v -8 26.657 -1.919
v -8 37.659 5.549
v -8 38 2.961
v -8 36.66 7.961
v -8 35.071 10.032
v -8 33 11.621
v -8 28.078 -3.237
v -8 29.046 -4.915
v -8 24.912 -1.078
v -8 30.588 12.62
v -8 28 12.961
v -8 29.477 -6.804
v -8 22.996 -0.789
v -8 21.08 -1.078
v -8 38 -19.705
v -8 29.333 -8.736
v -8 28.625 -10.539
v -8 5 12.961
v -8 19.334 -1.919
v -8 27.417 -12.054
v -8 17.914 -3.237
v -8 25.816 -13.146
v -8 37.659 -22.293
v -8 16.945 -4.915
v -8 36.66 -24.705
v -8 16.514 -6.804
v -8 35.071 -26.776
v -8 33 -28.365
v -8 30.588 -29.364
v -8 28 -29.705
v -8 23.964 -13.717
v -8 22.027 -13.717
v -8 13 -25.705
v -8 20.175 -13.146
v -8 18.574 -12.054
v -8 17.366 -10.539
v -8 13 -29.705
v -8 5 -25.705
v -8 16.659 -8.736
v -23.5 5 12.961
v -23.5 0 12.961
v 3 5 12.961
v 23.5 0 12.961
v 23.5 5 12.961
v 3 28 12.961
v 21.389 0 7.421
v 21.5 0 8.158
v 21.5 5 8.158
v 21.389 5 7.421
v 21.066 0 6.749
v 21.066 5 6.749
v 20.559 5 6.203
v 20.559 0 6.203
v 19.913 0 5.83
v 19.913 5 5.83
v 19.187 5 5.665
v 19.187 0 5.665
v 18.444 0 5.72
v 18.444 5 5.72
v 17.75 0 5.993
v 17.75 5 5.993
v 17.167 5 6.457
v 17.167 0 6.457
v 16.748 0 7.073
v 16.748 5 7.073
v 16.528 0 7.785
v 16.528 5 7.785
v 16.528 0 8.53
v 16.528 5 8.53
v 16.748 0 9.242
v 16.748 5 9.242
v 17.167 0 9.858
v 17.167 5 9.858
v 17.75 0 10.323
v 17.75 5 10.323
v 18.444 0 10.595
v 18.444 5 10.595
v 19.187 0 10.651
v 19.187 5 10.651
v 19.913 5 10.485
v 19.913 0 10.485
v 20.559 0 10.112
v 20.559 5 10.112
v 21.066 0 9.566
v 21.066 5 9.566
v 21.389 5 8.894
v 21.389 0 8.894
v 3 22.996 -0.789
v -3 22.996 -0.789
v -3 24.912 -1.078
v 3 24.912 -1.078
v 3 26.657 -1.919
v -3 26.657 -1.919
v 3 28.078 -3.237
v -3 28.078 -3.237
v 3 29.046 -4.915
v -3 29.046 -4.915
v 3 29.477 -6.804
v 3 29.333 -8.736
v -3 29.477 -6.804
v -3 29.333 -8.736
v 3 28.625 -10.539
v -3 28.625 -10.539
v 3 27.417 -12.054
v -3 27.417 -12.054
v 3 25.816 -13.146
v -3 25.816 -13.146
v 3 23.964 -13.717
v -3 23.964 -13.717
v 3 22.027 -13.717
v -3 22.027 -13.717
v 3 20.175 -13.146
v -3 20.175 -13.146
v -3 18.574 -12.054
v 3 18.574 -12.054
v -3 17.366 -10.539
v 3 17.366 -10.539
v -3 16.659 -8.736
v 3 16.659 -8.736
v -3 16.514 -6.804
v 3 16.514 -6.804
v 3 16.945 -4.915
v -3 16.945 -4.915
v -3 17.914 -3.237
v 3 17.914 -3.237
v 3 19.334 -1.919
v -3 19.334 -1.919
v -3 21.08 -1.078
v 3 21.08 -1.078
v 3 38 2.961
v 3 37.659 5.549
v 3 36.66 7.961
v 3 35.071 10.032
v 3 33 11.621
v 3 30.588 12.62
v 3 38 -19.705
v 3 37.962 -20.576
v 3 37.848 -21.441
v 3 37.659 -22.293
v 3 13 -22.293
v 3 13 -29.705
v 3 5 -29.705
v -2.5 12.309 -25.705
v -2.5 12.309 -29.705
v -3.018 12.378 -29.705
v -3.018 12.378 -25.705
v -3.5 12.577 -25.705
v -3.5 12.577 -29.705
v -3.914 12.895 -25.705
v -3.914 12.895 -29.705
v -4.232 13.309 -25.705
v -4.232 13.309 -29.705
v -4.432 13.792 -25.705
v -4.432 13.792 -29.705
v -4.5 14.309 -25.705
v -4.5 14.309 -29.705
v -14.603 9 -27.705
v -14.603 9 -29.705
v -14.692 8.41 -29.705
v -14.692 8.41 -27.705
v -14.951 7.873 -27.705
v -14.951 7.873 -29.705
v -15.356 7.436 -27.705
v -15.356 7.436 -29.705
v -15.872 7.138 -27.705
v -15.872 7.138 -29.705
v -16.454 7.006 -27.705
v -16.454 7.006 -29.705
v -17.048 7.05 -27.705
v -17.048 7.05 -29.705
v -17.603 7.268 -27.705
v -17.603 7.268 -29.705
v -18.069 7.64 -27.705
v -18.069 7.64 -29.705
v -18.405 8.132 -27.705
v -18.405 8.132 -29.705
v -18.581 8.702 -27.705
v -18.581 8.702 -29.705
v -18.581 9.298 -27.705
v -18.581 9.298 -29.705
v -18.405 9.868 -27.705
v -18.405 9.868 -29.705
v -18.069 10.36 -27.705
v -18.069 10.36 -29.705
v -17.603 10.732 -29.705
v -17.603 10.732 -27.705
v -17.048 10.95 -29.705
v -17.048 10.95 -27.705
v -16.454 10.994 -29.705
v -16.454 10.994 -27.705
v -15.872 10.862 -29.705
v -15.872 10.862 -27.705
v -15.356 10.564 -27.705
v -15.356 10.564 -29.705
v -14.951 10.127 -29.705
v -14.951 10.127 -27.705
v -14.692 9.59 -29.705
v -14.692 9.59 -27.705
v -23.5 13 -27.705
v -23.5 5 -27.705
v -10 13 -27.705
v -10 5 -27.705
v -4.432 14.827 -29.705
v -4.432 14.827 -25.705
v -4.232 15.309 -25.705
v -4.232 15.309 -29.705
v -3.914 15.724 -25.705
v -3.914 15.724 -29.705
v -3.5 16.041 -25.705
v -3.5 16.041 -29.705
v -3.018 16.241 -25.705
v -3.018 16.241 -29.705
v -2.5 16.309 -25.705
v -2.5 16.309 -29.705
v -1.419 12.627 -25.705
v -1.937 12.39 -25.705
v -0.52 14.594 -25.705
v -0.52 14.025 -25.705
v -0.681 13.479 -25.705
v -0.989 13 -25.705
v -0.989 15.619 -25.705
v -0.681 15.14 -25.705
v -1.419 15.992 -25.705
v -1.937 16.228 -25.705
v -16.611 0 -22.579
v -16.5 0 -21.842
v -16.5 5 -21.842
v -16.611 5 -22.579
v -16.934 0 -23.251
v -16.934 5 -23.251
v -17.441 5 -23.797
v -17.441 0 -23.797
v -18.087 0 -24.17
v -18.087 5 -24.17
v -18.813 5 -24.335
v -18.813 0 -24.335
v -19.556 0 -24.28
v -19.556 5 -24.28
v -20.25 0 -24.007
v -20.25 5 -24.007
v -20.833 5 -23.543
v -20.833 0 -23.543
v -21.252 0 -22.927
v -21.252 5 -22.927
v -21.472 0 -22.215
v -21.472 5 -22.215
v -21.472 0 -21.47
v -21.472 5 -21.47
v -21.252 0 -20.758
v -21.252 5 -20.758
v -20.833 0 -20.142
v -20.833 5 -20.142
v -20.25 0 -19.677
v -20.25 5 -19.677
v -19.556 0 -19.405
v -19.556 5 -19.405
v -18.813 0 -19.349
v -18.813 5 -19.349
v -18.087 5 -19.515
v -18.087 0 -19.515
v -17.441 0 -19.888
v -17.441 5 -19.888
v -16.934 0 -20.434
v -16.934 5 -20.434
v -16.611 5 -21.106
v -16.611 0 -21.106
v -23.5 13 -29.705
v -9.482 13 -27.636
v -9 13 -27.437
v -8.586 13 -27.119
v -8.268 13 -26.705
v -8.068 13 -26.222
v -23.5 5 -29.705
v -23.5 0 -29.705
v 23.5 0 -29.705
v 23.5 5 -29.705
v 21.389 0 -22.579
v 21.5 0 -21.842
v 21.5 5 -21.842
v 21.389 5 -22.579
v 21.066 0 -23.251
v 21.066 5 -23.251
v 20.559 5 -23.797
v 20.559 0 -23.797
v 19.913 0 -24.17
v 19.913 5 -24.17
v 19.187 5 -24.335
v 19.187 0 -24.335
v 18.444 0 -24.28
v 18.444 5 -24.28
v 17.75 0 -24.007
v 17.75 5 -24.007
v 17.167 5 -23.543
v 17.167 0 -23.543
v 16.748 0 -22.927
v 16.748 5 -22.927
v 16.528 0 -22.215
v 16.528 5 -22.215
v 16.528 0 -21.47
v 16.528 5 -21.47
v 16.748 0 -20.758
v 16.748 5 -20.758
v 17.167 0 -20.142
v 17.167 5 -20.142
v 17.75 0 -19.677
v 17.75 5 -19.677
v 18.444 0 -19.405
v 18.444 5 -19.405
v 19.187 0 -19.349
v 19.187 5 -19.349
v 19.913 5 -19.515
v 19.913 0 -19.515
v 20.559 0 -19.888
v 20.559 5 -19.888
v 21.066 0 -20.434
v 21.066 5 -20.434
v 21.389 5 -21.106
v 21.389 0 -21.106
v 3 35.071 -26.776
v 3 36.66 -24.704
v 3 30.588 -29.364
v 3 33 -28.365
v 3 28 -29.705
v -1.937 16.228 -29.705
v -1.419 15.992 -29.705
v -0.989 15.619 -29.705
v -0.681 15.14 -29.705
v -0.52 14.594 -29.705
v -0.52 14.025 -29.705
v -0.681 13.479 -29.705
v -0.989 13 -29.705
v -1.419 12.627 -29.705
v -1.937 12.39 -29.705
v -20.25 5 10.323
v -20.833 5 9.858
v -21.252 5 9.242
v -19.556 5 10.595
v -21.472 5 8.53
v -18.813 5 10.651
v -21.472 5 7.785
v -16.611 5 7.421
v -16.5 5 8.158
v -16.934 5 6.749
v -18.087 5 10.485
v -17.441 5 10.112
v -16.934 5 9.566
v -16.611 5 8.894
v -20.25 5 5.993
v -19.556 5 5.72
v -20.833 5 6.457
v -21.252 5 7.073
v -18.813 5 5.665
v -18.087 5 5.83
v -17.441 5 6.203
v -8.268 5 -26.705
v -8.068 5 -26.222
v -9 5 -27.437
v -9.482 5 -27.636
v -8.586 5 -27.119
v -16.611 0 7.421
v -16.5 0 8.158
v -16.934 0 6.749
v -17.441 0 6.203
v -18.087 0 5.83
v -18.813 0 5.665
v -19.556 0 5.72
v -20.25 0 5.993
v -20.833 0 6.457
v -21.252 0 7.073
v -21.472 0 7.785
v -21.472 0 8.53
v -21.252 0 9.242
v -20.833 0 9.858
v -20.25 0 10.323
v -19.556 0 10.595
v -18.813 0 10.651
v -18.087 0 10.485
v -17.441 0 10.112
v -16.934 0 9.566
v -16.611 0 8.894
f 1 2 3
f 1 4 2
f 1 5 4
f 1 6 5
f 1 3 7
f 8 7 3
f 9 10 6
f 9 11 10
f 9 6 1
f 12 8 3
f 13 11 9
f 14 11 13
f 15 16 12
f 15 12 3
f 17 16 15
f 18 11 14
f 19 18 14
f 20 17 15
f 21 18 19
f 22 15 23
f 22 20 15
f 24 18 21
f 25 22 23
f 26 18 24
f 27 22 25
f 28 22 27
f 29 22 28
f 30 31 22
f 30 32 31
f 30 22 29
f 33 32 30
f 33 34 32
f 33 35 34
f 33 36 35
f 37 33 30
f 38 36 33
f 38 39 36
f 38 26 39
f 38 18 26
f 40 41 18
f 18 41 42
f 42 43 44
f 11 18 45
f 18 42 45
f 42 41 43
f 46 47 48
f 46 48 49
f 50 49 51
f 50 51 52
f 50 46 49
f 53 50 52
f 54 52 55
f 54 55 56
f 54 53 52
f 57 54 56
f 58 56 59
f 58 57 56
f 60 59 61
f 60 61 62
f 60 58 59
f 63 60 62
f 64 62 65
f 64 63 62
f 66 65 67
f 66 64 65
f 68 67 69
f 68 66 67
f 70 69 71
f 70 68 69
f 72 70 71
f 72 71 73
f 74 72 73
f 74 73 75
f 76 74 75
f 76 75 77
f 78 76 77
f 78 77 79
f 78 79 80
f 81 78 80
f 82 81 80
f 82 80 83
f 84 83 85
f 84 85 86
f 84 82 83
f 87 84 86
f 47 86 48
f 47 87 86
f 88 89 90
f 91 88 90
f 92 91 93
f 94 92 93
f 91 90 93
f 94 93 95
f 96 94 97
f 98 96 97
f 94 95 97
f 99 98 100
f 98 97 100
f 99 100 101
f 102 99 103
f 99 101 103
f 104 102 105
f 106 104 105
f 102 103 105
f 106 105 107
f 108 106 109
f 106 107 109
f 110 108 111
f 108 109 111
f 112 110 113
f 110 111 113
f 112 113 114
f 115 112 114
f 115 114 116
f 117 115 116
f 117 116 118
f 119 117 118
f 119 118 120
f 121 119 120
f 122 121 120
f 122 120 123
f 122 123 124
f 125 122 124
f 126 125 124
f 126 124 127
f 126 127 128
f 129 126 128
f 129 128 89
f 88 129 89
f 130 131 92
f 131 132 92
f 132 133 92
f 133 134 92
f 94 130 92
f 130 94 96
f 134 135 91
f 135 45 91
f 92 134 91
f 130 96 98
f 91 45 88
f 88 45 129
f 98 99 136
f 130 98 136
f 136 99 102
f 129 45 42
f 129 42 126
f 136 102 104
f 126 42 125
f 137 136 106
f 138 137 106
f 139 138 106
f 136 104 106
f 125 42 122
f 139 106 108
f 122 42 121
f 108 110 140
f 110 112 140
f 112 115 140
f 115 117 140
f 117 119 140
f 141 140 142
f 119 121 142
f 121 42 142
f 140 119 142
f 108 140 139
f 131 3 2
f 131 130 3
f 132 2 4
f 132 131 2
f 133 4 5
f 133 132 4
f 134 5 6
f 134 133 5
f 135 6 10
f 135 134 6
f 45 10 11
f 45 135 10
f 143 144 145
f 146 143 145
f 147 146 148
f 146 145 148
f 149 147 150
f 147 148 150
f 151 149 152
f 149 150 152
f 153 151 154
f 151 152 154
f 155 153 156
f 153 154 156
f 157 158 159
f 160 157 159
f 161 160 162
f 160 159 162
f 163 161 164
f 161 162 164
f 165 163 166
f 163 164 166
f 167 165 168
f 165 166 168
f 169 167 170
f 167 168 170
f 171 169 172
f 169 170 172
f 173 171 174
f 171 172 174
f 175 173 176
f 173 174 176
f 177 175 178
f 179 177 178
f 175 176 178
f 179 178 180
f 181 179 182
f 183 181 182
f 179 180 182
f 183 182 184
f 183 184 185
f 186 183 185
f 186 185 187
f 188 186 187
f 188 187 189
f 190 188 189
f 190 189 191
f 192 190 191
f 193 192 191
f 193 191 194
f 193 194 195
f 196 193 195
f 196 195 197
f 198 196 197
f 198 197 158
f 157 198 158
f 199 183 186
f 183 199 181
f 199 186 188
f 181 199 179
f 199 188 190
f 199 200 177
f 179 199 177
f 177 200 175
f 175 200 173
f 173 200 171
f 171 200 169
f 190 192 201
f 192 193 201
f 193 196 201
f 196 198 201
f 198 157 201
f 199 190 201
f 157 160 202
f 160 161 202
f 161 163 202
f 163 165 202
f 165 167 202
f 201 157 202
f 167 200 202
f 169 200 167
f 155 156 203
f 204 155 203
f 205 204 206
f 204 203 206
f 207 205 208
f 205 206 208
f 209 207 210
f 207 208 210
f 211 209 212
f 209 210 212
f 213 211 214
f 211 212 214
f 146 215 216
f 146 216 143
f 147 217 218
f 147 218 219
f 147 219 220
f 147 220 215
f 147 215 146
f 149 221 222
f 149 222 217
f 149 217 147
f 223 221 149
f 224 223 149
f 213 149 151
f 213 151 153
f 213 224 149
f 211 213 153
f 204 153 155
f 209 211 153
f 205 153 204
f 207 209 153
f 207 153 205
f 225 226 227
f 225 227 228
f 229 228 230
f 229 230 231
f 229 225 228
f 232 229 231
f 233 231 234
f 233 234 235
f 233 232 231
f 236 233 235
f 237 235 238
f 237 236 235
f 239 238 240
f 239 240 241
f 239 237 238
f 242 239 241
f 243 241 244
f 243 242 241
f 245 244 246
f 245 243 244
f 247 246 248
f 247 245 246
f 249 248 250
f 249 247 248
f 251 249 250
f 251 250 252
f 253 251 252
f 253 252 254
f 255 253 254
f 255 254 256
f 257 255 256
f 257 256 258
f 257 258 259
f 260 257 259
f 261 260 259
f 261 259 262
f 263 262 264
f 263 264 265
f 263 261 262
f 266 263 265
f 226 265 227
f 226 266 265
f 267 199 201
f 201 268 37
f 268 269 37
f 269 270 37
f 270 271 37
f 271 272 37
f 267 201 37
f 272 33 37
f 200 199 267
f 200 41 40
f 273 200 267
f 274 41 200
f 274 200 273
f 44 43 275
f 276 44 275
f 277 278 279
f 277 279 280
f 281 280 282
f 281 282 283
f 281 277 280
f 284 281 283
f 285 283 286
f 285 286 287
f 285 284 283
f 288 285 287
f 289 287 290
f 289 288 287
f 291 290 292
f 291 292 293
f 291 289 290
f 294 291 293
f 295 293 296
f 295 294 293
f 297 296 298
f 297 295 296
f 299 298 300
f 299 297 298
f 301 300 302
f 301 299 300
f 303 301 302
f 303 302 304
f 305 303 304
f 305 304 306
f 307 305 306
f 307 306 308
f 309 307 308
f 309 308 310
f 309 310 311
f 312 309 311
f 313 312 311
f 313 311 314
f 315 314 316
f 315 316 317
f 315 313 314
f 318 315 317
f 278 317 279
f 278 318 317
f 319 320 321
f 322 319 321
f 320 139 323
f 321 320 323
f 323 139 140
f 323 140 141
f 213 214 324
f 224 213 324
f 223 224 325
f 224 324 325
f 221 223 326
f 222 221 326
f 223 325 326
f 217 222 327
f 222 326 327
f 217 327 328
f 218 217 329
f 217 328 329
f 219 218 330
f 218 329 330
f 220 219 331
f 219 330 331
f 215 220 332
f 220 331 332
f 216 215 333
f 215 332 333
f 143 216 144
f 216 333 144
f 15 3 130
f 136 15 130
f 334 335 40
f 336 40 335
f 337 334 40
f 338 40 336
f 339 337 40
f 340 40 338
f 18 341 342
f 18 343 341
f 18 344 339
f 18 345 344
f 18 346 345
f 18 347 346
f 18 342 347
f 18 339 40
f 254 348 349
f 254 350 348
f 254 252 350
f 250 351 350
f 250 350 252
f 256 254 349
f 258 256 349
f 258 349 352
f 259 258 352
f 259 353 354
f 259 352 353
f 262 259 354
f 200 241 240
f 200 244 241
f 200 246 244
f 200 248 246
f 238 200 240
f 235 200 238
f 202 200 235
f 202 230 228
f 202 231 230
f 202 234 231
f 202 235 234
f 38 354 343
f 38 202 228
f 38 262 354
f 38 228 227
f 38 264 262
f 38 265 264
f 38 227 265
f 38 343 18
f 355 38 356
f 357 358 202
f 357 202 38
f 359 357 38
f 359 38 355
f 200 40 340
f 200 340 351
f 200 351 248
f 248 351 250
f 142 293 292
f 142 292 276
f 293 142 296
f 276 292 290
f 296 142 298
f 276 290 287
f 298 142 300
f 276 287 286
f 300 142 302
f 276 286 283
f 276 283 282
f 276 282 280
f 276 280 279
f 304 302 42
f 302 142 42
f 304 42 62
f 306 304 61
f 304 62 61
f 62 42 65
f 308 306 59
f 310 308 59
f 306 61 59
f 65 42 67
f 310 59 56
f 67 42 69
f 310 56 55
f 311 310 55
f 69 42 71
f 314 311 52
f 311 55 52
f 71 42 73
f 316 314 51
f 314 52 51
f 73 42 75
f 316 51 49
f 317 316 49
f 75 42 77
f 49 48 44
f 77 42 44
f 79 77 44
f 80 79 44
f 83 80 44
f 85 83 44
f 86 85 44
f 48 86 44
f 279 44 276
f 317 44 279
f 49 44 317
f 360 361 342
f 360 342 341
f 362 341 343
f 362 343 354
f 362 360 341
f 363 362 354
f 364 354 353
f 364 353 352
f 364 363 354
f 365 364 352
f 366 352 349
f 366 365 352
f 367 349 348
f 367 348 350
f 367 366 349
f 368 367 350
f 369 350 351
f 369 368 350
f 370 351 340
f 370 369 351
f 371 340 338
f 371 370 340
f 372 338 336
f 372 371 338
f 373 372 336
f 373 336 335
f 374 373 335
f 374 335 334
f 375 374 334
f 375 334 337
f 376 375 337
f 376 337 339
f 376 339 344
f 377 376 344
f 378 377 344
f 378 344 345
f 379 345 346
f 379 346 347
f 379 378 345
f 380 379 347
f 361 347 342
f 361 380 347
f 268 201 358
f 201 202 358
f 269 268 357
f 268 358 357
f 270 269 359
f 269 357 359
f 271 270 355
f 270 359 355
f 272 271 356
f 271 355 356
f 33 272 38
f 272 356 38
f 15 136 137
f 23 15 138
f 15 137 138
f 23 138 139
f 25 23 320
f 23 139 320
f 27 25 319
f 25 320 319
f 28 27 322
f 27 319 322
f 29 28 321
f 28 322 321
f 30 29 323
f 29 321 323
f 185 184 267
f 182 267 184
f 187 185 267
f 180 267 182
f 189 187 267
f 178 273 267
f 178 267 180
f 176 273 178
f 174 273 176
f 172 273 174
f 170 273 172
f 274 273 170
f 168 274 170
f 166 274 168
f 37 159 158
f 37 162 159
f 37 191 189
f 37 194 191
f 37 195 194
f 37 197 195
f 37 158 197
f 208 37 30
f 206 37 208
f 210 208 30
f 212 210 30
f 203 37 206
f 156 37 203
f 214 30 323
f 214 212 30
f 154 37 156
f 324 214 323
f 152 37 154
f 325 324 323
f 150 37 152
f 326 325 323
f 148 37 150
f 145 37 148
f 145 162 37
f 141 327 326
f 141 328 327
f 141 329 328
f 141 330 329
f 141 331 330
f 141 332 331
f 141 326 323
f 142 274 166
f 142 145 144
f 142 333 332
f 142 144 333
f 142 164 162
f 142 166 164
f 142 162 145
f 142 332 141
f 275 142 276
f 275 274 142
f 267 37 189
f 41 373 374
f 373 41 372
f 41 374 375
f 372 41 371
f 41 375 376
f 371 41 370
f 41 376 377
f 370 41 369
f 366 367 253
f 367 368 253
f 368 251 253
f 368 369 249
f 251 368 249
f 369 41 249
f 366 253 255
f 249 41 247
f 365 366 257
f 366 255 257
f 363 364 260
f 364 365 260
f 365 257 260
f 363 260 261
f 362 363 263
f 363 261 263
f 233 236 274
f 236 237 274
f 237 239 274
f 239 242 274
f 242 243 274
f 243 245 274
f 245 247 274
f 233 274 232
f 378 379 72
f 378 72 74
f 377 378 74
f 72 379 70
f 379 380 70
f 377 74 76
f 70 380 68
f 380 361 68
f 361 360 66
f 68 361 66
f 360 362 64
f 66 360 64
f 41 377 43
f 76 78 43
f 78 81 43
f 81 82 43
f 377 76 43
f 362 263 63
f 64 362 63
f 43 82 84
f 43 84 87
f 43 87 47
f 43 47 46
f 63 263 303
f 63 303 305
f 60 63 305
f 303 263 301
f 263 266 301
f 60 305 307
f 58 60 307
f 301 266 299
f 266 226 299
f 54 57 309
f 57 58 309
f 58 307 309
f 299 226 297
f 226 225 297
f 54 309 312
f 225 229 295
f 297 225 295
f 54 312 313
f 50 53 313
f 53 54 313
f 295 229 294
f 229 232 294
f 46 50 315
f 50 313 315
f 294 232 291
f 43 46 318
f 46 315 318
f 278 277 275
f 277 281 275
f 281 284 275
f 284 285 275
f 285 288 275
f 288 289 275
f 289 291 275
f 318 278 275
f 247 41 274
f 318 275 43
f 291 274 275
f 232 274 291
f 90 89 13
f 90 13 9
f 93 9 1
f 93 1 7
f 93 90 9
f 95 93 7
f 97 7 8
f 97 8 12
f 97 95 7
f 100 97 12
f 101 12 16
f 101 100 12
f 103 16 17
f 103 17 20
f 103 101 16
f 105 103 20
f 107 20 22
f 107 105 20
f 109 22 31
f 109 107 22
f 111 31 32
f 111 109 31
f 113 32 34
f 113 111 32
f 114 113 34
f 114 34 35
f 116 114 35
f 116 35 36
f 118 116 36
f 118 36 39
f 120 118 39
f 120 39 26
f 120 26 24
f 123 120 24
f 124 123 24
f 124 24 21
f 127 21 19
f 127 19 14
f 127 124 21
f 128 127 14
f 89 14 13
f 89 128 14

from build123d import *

# Parameters (mm, degrees)
SKETCH_1_W           = 47
SKETCH_1_H           = 42.665281763
SKETCH_1_R           = 2.5
EXTRUDE_1_DEPTH      = 5
SKETCH_2_W           = 6
SKETCH_2_H           = 42.665281763
SKETCH_2_W_2         = 47
SKETCH_2_H_2         = 2
EXTRUDE_2_DEPTH      = 33
SKETCH_3_W           = 40.665281763
SKETCH_3_H           = 33
EXTRUDE_3_DEPTH      = 6
SKETCH_4_R           = 6.5
CUT_EXTRUDE_2_DEPTH  = 7
CHAMFER_1_SIZE       = 3
CUT_EXTRUDE_8_DEPTH  = 25
SKETCH_7_W           = 20.5
SKETCH_7_H           = 8
CUT_EXTRUDE_9_DEPTH  = 10
SKETCH_8_R           = 6.5
EXTRUDE_4_DEPTH      = 5
FILLET_4_R           = 2
SKETCH_9_W           = 11
SKETCH_9_H           = 7.412058926
EXTRUDE_5_DEPTH      = 25
FILLET_5_R           = 10
CUT_EXTRUDE_10_DEPTH = 4


with BuildPart() as part:
    # 草图1 → 凸台-拉伸1 (new body)
    with BuildSketch(Plane(origin=(0, 0, 0), x_dir=(1, 0, 0), z_dir=(0, 1, 0))):
        with Locations((0, 8.371925414)):
            Rectangle(SKETCH_1_W, SKETCH_1_H)
        with Locations((19, -8.15756763)):
            Circle(SKETCH_1_R, mode=Mode.SUBTRACT)
        with Locations((-19, -8.15756763)):
            Circle(SKETCH_1_R, mode=Mode.SUBTRACT)
        with Locations((19, 21.84243237)):
            Circle(SKETCH_1_R, mode=Mode.SUBTRACT)
        with Locations((-19, 21.84243237)):
            Circle(SKETCH_1_R, mode=Mode.SUBTRACT)
    extrude(amount=EXTRUDE_1_DEPTH)

    # 草图2 → 凸台-拉伸2 (add)
    with BuildSketch(Plane(origin=(0, 5, 0), x_dir=(1, 0, 0), z_dir=(0, 1, 0))):
        with Locations((0, 8.371925414)):
            Rectangle(SKETCH_2_W, SKETCH_2_H)
        with Locations((0, 28.704566295)):
            Rectangle(SKETCH_2_W_2, SKETCH_2_H_2)
    extrude(amount=EXTRUDE_2_DEPTH)

    # 草图3 → 凸台-拉伸3 (add)
    with BuildSketch(Plane.ZY.offset(3)):
        with Locations((-7.371925414, 21.5)):
            Rectangle(SKETCH_3_W, SKETCH_3_H)
        with Locations((-7.371925414, 21.5)):
            Rectangle(SKETCH_3_W, SKETCH_3_H)
        with Locations((-7.371925414, 21.5)):
            Rectangle(SKETCH_3_W, SKETCH_3_H)
        with Locations((-7.371925414, 21.5)):
            Rectangle(SKETCH_3_W, SKETCH_3_H)
        with Locations((-7.371925414, 21.5)):
            Rectangle(SKETCH_3_W, SKETCH_3_H)
        with Locations((-7.371925414, 21.5)):
            Rectangle(SKETCH_3_W, SKETCH_3_H)
        with Locations((-7.371925414, 21.5)):
            Rectangle(SKETCH_3_W, SKETCH_3_H)
        with Locations((-7.371925414, 21.5)):
            Rectangle(SKETCH_3_W, SKETCH_3_H)
    extrude(amount=-EXTRUDE_3_DEPTH)

    # 草图4 → 切除-拉伸2 (cut)
    with BuildSketch(Plane(origin=(-3, 2.117173295, 0), x_dir=(0, 0, 1), z_dir=(-1, 0, 0))):
        with Locations((-7.289458503, 20.878429676)):
            Circle(SKETCH_4_R)
    extrude(amount=-CUT_EXTRUDE_2_DEPTH, mode=Mode.SUBTRACT)

    # 倒角1
    chamfer_1_edges = [part.edges().sort_by_distance(p)[0] for p in [
        (23.5, 38, -28.704566295),
        (-23.5, 38, -28.704566295),
    ]]
    chamfer(chamfer_1_edges, length=CHAMFER_1_SIZE)

    # 草图6 → 切除-拉伸8 (cut)
    with BuildSketch(Plane(origin=(0, 38, 0), x_dir=(1, 0, 0), z_dir=(0, 1, 0))):
        Polygon((-26.394551402, 22.292507369), (-3, 22.292507369), (-3, 27.704566295), (-20.5, 27.704566295), (-20.5, 29.704566295), (20.5, 29.704566295), (20.5, 27.704566295), (3, 27.704566295), (3, 22.292507369), (28.987300096, 22.292507369), (28.987300096, 31.415661045), (-26.394551402, 31.415661045), align=None)
        Polygon((-3, 27.704566295), (-3, 22.292507369), (3, 22.292507369), (3, 27.704566295), (20.5, 27.704566295), (20.5, 29.704566295), (-20.5, 29.704566295), (-20.5, 27.704566295), align=None)
    extrude(amount=-CUT_EXTRUDE_8_DEPTH, mode=Mode.SUBTRACT)

    # 草图7 → 切除-拉伸9 (cut)
    with BuildSketch(Plane.XY.offset(-27.704566295)):
        with Locations((13.25, 9)):
            Rectangle(SKETCH_7_W, SKETCH_7_H)
    extrude(amount=-CUT_EXTRUDE_9_DEPTH, mode=Mode.SUBTRACT)

    # 草图8 → 凸台-拉伸4 (add)
    with BuildSketch(Plane.ZY.offset(3)):
        Polygon((12.960715468, 38), (-22.292507369, 38), (-22.292507369, 13), (-27.704566295, 13), (-27.704566295, 5), (12.960715468, 5), align=None)
        with Locations((-7.289458503, 22.995602971)):
            Circle(SKETCH_8_R, mode=Mode.SUBTRACT)
    extrude(amount=EXTRUDE_4_DEPTH)

    # 圆角4
    fillet_4_edges = [part.edges().sort_by_distance(p)[0] for p in [
        (-8, 9, -27.704566295),
    ]]
    fillet(fillet_4_edges, radius=FILLET_4_R)

    # 草图9 → 凸台-拉伸5 (add)
    with BuildSketch(Plane(origin=(0, 13, 0), x_dir=(1, 0, 0), z_dir=(0, 1, 0))):
        with Locations((-2.5, 25.998536832)):
            Rectangle(SKETCH_9_W, SKETCH_9_H)
    extrude(amount=EXTRUDE_5_DEPTH)

    # 圆角5
    fillet_5_edges = [part.edges().sort_by_distance(p)[0] for p in [
        (-2.5, 38, -29.704566295),
        (-2.5, 38, 12.960715468),
    ]]
    fillet(fillet_5_edges, radius=FILLET_5_R)

    # 草图10 → 切除-拉伸10 (cut)
    with BuildSketch(Plane(origin=(0, 0, -29.704566295), x_dir=(-1, 0, 0), z_dir=(0, 0, -1))):
        with BuildLine():
            ThreePointArc((18.603175919, 9), (16.603175919, 11), (14.603175919, 9))
            Line((14.603175919, 9), (18.603175919, 9))
        make_face()
        with BuildLine():
            Line((18.603175919, 9), (14.603175919, 9))
            ThreePointArc((14.603175919, 9), (16.603175919, 7), (18.603175919, 9))
        make_face()
        with BuildLine():
            ThreePointArc((18.603175919, 9), (16.603175919, 11), (14.603175919, 9))
            Line((14.603175919, 9), (18.603175919, 9))
        make_face()
        with BuildLine():
            Line((18.603175919, 9), (14.603175919, 9))
            ThreePointArc((14.603175919, 9), (16.603175919, 7), (18.603175919, 9))
        make_face()
        with BuildLine():
            ThreePointArc((4.5, 14.309411668), (3.914213562, 15.723625231), (2.5, 16.309411668))
            Line((2.5, 16.309411668), (2.5, 12.309411668))
            ThreePointArc((2.5, 12.309411668), (3.914213562, 12.895198106), (4.5, 14.309411668))
        make_face()
        with BuildLine():
            Line((2.5, 12.309411668), (2.5, 16.309411668))
            ThreePointArc((2.5, 16.309411668), (0.5, 14.309411668), (2.5, 12.309411668))
        make_face()
        with BuildLine():
            ThreePointArc((4.5, 14.309411668), (3.914213562, 15.723625231), (2.5, 16.309411668))
            Line((2.5, 16.309411668), (2.5, 12.309411668))
            ThreePointArc((2.5, 12.309411668), (3.914213562, 12.895198106), (4.5, 14.309411668))
        make_face()
        with BuildLine():
            Line((2.5, 12.309411668), (2.5, 16.309411668))
            ThreePointArc((2.5, 16.309411668), (0.5, 14.309411668), (2.5, 12.309411668))
        make_face()
    extrude(amount=-CUT_EXTRUDE_10_DEPTH, mode=Mode.SUBTRACT)


solid = part.part
